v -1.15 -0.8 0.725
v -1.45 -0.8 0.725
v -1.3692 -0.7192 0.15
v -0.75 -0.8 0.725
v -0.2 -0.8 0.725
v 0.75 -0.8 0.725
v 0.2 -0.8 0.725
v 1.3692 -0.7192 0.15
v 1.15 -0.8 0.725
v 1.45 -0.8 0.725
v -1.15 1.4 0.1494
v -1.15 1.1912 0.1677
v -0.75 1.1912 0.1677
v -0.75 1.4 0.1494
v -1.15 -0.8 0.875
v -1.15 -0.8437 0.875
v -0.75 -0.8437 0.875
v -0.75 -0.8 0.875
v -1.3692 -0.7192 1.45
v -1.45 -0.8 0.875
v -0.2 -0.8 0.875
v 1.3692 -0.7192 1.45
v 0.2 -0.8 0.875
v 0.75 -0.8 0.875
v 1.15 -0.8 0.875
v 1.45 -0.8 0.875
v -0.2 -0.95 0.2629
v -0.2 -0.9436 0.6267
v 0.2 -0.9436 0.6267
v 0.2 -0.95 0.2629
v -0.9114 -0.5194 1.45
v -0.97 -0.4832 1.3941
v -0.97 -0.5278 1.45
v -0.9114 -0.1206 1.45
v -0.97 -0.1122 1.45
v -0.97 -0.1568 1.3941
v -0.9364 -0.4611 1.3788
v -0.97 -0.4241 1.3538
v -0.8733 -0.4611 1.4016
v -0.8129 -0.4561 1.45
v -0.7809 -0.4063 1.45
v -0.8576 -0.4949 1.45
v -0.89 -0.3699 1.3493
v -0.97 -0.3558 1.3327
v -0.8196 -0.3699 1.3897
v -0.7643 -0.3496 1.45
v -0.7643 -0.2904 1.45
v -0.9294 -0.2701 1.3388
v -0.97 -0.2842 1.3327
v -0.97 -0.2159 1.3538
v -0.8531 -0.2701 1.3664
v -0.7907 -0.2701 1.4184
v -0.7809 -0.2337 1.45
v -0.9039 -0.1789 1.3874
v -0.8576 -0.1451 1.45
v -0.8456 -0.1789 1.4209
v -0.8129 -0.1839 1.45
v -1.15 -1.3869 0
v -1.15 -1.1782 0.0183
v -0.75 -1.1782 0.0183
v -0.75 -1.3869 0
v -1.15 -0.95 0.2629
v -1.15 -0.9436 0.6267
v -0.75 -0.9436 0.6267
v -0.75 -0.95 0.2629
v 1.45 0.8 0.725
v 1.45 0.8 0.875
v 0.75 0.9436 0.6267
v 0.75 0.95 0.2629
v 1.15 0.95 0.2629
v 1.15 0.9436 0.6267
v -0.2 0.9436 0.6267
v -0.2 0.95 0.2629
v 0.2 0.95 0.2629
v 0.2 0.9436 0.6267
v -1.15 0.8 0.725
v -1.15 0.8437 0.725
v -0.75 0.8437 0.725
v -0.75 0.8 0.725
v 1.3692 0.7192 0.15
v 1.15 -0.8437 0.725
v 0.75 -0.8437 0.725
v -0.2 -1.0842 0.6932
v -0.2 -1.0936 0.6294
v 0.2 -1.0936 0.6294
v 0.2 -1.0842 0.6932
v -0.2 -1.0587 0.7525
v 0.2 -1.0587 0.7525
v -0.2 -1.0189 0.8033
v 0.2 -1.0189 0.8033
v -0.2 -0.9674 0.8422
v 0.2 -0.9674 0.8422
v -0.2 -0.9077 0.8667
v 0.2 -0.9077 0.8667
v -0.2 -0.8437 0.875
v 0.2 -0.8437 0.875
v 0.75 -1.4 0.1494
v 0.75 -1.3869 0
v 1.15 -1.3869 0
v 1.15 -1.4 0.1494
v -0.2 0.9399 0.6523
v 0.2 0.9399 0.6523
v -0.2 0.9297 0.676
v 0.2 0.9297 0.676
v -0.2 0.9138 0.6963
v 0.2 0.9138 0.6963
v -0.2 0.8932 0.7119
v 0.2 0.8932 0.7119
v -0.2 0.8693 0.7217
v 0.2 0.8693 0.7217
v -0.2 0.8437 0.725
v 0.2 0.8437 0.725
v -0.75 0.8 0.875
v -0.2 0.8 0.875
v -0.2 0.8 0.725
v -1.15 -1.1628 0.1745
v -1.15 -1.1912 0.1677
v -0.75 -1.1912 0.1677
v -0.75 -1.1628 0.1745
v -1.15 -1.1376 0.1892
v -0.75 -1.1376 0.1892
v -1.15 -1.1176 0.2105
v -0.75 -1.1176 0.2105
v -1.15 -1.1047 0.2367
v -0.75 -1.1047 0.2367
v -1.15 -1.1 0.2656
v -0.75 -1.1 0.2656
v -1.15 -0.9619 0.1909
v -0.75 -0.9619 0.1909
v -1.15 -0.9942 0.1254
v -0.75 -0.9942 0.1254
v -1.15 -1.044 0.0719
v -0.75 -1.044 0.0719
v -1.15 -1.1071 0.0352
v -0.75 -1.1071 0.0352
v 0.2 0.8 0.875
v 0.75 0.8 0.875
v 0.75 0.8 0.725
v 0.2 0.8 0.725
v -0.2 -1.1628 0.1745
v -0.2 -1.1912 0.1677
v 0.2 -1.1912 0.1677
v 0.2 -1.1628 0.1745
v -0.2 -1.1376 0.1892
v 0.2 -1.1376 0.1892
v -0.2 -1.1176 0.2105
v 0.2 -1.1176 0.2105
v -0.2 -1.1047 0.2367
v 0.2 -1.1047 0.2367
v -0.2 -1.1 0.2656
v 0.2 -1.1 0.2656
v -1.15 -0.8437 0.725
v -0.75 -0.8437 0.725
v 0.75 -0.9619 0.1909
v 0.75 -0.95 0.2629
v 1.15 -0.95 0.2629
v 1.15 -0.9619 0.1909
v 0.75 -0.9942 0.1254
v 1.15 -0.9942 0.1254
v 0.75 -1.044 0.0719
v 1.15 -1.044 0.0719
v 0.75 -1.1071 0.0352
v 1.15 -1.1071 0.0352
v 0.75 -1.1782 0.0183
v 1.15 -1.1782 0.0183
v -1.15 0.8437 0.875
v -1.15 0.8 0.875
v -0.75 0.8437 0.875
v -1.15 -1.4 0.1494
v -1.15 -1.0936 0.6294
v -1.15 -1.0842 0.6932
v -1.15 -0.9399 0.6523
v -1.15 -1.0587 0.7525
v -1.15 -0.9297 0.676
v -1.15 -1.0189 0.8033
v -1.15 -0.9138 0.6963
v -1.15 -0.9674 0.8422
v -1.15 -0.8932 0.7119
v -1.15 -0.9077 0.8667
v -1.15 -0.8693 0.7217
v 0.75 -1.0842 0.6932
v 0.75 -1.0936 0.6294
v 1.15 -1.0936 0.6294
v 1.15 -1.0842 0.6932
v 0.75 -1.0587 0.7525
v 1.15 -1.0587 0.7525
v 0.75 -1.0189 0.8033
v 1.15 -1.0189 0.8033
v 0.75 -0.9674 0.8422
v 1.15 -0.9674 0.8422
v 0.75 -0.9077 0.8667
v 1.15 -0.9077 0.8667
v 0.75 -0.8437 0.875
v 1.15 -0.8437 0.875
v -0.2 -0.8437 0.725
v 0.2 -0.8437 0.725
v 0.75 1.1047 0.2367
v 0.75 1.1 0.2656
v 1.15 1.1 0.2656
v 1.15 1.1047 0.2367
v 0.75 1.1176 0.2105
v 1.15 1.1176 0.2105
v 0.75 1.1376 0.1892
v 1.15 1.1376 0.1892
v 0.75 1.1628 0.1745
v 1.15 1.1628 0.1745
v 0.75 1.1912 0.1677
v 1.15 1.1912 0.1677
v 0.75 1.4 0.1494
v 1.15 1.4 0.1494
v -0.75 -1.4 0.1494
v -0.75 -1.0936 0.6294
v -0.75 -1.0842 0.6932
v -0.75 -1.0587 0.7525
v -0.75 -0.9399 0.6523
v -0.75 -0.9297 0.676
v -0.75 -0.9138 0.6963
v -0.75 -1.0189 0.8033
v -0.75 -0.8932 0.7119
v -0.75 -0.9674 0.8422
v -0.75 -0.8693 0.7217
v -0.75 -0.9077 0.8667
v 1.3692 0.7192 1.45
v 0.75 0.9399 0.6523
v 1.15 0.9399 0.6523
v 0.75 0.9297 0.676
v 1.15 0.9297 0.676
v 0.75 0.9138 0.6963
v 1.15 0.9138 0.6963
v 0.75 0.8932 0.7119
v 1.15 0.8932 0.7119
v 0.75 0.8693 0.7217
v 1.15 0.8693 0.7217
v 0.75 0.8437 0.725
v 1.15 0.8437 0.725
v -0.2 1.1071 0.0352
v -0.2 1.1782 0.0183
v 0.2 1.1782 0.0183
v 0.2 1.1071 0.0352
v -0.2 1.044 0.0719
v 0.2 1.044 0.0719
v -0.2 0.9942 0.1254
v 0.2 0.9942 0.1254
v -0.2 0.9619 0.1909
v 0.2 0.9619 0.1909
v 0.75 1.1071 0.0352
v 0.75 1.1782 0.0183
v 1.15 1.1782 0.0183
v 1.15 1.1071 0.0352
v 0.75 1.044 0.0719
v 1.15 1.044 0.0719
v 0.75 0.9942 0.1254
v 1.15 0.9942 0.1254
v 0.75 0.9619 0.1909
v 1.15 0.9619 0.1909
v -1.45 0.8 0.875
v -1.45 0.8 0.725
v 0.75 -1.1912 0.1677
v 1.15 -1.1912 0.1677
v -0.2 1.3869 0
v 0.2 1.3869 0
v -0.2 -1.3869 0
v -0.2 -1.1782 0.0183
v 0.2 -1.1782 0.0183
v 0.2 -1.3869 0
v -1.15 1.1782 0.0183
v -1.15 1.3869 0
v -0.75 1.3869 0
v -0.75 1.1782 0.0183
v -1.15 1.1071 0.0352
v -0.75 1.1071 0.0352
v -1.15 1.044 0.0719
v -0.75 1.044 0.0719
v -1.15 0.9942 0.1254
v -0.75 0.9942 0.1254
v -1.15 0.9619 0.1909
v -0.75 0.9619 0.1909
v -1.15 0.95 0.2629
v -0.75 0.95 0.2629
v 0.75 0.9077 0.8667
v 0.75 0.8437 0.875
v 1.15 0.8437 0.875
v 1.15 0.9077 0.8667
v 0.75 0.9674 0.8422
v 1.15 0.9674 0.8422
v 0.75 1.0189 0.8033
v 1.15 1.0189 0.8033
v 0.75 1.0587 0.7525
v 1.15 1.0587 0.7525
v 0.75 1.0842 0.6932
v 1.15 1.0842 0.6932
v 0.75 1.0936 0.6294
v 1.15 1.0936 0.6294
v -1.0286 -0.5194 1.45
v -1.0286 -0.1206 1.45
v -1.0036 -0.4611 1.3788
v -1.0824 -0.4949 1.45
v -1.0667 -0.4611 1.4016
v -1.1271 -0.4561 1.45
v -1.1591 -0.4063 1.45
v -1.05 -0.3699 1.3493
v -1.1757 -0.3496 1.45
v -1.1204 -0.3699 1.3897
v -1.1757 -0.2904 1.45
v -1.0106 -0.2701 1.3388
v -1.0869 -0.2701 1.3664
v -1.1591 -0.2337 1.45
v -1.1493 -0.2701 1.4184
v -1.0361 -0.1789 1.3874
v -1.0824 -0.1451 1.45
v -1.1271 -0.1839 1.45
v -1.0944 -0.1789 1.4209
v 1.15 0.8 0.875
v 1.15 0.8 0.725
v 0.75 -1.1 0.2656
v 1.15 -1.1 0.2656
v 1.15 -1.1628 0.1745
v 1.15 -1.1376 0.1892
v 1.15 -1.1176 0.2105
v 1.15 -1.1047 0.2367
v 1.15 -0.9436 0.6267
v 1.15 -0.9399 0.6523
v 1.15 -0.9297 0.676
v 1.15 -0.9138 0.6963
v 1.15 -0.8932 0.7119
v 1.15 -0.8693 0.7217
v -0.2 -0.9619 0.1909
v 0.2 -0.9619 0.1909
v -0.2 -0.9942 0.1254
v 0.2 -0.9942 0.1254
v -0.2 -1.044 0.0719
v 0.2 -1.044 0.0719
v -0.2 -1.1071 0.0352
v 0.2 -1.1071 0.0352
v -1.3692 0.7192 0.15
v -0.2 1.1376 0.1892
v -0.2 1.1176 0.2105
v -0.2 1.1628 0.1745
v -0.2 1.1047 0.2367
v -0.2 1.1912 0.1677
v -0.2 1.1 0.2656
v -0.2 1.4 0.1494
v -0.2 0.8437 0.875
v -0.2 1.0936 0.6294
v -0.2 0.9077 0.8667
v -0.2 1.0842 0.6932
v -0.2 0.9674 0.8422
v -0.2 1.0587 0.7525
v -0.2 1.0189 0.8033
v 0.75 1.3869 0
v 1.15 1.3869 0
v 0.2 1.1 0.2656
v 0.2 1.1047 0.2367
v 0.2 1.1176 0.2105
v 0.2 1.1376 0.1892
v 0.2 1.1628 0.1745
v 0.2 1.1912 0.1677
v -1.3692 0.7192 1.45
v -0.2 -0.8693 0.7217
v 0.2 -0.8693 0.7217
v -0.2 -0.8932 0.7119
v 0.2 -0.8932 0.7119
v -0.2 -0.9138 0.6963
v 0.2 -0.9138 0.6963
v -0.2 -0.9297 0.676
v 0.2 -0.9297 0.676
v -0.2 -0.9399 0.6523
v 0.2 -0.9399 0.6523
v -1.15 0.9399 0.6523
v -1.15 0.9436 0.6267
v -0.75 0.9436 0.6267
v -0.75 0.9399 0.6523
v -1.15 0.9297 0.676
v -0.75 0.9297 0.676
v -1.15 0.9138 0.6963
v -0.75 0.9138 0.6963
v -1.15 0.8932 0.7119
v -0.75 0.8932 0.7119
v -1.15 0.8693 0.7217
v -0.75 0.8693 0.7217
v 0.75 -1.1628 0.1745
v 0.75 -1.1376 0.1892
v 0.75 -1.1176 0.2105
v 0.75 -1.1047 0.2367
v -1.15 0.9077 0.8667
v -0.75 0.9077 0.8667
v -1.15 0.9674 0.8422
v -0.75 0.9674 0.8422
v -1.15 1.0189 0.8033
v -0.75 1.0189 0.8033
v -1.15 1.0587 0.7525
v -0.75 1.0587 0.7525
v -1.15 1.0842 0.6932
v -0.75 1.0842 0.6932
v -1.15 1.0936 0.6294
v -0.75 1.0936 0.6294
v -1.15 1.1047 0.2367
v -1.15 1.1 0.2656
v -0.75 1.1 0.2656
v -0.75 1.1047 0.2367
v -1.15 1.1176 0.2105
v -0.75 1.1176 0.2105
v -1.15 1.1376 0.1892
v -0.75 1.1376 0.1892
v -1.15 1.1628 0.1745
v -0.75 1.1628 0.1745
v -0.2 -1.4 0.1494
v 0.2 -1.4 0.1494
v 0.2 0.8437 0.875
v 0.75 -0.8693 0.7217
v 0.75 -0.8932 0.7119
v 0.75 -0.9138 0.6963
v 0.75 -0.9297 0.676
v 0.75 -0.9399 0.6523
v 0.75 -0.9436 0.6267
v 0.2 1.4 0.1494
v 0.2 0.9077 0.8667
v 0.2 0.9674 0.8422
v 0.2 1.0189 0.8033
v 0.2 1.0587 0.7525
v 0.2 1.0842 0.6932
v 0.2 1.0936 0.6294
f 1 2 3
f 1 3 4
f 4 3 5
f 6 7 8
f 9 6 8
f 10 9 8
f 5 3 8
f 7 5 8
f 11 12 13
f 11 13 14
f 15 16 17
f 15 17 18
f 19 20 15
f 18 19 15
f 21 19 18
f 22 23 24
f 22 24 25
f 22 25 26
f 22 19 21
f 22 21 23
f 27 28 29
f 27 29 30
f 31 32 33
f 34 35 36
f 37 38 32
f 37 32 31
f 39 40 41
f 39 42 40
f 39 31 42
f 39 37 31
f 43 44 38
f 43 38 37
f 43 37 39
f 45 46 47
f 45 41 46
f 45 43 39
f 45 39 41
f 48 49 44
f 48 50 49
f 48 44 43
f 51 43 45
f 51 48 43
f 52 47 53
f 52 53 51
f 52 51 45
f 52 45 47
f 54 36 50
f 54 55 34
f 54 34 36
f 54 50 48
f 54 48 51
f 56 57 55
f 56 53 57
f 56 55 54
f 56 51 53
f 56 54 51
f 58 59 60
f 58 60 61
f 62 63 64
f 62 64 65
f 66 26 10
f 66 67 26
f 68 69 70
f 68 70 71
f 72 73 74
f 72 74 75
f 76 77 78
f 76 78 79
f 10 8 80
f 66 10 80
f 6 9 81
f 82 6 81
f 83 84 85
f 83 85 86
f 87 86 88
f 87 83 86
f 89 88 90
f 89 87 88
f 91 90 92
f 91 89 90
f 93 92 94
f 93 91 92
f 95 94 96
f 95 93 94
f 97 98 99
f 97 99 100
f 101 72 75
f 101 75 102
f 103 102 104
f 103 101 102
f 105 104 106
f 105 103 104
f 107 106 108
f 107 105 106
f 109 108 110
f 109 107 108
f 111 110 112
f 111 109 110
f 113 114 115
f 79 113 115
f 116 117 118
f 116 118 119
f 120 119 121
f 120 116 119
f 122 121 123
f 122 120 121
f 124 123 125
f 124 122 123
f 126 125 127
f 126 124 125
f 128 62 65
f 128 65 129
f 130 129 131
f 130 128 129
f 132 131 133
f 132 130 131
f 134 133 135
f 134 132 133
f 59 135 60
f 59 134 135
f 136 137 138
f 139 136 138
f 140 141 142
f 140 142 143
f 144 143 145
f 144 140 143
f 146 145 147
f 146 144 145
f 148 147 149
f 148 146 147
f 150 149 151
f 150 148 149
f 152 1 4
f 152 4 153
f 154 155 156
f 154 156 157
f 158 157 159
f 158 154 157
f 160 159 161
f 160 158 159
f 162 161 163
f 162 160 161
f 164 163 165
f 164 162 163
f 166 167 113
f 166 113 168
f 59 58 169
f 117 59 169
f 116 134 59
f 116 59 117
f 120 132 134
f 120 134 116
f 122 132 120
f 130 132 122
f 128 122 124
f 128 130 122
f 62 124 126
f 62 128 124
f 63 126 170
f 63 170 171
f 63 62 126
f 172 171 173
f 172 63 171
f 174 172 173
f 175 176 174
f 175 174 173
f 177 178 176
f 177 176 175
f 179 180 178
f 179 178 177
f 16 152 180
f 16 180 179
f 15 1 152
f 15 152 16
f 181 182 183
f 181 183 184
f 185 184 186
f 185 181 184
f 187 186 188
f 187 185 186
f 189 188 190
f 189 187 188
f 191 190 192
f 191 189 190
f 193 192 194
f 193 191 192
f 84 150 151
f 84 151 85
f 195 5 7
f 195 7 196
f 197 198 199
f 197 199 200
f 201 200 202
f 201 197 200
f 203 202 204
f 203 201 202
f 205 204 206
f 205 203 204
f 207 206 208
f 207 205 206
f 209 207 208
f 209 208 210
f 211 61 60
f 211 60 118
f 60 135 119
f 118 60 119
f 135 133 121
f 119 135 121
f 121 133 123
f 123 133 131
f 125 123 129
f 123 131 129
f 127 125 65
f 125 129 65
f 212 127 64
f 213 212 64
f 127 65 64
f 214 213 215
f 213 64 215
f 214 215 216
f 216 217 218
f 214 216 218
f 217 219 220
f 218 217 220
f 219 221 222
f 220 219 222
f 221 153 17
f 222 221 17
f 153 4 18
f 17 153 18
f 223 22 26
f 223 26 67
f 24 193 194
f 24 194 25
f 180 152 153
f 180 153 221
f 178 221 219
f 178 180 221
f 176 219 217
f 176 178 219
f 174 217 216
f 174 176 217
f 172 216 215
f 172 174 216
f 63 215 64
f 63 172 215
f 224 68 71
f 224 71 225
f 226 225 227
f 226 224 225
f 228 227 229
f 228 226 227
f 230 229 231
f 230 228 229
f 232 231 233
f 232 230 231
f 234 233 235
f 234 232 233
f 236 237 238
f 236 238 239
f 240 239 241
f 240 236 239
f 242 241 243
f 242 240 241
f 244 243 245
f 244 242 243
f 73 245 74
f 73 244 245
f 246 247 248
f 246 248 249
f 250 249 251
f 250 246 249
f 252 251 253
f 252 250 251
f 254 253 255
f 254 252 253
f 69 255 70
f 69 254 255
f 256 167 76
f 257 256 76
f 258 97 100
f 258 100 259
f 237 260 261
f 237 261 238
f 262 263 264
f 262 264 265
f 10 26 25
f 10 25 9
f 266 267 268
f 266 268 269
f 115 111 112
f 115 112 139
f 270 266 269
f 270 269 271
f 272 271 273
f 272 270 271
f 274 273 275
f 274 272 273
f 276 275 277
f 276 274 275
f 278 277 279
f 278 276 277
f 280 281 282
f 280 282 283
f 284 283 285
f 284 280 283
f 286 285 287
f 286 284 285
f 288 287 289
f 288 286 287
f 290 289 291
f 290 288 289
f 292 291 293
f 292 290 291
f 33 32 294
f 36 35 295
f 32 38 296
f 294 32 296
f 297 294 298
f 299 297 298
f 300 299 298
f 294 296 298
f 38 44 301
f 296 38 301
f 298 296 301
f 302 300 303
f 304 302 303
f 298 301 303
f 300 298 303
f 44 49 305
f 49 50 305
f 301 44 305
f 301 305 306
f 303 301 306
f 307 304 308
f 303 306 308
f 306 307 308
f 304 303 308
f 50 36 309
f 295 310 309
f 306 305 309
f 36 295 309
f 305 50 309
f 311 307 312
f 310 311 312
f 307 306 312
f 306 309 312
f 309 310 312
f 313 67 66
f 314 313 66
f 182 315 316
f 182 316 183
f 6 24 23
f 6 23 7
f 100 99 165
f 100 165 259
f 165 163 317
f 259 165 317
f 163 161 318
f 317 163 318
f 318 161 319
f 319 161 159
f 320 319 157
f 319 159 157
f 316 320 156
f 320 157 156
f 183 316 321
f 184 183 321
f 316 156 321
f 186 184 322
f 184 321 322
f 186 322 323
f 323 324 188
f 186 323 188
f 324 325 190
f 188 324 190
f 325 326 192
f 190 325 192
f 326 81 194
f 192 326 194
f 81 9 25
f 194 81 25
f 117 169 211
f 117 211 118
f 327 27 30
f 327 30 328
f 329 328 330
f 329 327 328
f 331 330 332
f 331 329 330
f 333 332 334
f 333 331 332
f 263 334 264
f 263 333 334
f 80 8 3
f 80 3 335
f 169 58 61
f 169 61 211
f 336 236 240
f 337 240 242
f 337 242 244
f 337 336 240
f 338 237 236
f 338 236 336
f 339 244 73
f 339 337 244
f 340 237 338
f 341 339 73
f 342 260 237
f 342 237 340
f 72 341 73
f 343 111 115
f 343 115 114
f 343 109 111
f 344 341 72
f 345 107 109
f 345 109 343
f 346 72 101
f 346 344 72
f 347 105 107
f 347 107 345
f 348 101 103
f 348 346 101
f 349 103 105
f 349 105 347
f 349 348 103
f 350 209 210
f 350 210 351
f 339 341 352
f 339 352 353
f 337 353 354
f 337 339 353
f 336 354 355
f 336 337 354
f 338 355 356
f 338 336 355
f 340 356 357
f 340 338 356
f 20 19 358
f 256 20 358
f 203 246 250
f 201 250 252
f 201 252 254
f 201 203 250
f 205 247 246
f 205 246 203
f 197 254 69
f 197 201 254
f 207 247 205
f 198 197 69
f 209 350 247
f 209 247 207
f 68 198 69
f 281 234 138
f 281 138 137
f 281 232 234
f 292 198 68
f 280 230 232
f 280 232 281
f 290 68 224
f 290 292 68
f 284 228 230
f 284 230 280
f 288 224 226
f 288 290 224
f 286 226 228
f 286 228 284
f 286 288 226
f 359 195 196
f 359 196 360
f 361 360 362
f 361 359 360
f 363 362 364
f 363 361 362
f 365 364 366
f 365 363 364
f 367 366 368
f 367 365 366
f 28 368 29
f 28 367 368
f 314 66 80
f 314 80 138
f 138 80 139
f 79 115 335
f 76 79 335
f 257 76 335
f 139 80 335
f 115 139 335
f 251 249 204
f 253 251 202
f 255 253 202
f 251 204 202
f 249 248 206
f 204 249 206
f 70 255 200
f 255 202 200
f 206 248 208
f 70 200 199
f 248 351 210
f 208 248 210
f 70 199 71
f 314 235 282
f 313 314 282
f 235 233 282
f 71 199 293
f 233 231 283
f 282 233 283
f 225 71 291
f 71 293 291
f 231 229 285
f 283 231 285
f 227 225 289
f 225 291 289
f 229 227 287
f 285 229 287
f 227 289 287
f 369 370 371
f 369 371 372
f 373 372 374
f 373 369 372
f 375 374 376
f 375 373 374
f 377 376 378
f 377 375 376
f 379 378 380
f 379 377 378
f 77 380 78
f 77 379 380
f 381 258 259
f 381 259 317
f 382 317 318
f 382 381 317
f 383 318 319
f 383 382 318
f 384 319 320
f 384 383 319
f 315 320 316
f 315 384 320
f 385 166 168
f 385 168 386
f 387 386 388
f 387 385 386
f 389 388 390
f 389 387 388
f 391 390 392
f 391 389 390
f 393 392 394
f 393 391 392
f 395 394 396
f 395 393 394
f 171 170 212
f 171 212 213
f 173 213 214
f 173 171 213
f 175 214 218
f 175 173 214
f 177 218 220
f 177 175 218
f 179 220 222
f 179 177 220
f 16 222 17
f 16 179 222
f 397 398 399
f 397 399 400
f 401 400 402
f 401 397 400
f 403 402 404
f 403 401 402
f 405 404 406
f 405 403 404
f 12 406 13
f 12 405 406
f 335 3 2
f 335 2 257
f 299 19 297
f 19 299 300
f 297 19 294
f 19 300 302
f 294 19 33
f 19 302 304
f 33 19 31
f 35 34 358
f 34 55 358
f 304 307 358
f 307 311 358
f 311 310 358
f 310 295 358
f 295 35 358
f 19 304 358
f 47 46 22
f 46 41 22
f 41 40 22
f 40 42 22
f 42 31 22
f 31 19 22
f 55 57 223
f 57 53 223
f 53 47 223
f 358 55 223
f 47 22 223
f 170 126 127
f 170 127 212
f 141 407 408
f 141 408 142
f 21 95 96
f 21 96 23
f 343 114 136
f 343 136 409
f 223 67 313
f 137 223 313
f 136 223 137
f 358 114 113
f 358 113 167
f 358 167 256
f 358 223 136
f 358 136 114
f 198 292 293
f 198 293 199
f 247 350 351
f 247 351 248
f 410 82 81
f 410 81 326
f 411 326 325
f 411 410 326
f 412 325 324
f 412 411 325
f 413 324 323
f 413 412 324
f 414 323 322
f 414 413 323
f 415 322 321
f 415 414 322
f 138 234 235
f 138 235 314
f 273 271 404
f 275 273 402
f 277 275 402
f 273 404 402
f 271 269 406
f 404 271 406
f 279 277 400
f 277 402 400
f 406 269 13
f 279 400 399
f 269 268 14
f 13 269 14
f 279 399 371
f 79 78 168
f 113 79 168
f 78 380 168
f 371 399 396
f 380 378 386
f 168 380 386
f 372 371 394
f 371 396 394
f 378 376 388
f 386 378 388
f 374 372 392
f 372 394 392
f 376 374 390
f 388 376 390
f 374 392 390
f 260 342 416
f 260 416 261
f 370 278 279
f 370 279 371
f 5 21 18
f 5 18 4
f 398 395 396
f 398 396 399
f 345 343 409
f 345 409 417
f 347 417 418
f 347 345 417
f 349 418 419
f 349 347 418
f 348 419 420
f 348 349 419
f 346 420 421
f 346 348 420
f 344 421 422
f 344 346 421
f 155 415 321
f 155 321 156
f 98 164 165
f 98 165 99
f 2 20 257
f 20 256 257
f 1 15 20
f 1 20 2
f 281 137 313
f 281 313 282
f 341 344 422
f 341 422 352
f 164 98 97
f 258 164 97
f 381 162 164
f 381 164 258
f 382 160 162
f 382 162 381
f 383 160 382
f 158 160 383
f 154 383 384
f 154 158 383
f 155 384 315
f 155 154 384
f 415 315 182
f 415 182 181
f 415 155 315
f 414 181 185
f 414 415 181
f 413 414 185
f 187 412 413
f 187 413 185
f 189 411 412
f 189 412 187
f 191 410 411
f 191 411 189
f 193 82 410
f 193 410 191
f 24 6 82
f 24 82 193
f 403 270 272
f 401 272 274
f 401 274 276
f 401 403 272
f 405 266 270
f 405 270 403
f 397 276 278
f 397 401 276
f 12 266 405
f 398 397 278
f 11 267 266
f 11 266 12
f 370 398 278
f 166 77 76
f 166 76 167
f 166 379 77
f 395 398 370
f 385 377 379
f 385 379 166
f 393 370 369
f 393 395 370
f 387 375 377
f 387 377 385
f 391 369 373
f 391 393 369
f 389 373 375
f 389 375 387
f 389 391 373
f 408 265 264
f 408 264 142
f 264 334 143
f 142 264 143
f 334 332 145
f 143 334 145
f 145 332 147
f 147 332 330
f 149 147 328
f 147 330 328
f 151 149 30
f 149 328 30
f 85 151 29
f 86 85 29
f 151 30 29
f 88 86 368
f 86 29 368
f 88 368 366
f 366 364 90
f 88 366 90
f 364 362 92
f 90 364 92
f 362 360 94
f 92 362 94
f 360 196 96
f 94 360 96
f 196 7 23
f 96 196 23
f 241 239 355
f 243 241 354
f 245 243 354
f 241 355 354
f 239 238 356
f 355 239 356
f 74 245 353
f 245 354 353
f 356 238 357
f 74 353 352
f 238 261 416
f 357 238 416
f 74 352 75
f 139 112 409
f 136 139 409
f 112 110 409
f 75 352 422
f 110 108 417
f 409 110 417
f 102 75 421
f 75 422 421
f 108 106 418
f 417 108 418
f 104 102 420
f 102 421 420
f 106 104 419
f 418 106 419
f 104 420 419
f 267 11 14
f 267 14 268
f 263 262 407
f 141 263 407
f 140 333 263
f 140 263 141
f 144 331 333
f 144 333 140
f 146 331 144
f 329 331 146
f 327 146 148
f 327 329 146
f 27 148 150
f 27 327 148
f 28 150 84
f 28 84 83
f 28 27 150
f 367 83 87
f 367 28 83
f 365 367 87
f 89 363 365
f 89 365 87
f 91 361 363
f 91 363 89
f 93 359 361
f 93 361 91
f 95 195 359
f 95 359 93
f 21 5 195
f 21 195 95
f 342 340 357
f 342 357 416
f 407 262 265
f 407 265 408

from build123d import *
from OCP.BRepFilletAPI import BRepFilletAPI_MakeChamfer
from build123d.topology import SkipClean

# Parameters (mm, degrees)
BODYWXH_W          = 1.3
BODYWXH_H          = 1.6
BOSS_BODY_DEPTH    = 1.45
CHAMFER1_SIZE      = 0.575
CHAMFER1_SIZE2     = 0.08081098
PINS_DEPTH         = 0.4
PATTERNLEADS_COUNT = 3
PATTERNLEADS_PITCH = 0.95


with BuildPart() as part:
    # BodyWxH → Boss-Body (new, symmetric)
    with BuildSketch(Plane(origin=(0, 0, 0), x_dir=(0, 0, -1), z_dir=(1, 0, 0))):
        with Locations((-0.8, 0)):
            Rectangle(BODYWXH_W, BODYWXH_H)
    extrude(amount=BOSS_BODY_DEPTH, both=True)

    # Chamfer1: one chamfer whose edges measure the first distance from different faces: ONE call of the kernel's chamfer builder (chamfer() names one face for all edges)
    chamfer1_edges_1 = [part.edges().sort_by_distance(p)[0] for p in [
        (0, -0.8, 0.15),
        (0, -0.8, 1.45),
    ]]
    chamfer1_side_1 = [part.faces().sort_by_distance(p)[0] for p in [
        (0, -0.8, 0.8),
    ]]
    chamfer1_edges_2 = [part.edges().sort_by_distance(p)[0] for p in [
        (1.45, 0, 0.15),
        (1.45, 0, 1.45),
    ]]
    chamfer1_side_2 = [part.faces().sort_by_distance(p)[0] for p in [
        (1.45, 0, 0.8),
    ]]
    chamfer1_edges_3 = [part.edges().sort_by_distance(p)[0] for p in [
        (0, 0.8, 0.15),
        (0, 0.8, 1.45),
    ]]
    chamfer1_side_3 = [part.faces().sort_by_distance(p)[0] for p in [
        (0, 0.8, 0.8),
    ]]
    chamfer1_edges_4 = [part.edges().sort_by_distance(p)[0] for p in [
        (-1.45, 0, 0.15),
        (-1.45, 0, 1.45),
    ]]
    chamfer1_side_4 = [part.faces().sort_by_distance(p)[0] for p in [
        (-1.45, 0, 0.8),
    ]]
    chamfer1 = BRepFilletAPI_MakeChamfer(part.part.solid().wrapped)
    for e in chamfer1_edges_1:
        chamfer1.Add(CHAMFER1_SIZE, CHAMFER1_SIZE2, e.wrapped, chamfer1_side_1[0].wrapped)  # the first distance lies on this face
    for e in chamfer1_edges_2:
        chamfer1.Add(CHAMFER1_SIZE, CHAMFER1_SIZE2, e.wrapped, chamfer1_side_2[0].wrapped)  # the first distance lies on this face
    for e in chamfer1_edges_3:
        chamfer1.Add(CHAMFER1_SIZE, CHAMFER1_SIZE2, e.wrapped, chamfer1_side_3[0].wrapped)  # the first distance lies on this face
    for e in chamfer1_edges_4:
        chamfer1.Add(CHAMFER1_SIZE, CHAMFER1_SIZE2, e.wrapped, chamfer1_side_4[0].wrapped)  # the first distance lies on this face
    add(Compound.cast(chamfer1.Shape()), mode=Mode.REPLACE)

    # LeadCross → Pins (add)
    with BuildSketch(Plane(origin=(-1.15, 0, 0), x_dir=(0, 0, -1), z_dir=(1, 0, 0))):
        with BuildLine():
            Line((0, -1.386926639), (-0.149429205, -1.4))
            Line((-0.149429205, -1.4), (-0.167692783, -1.19124635))
            ThreePointArc((-0.167692783, -1.19124635), (-0.199112416, -1.126826554), (-0.265567012, -1.099977154))
            Line((-0.265567012, -1.099977154), (-0.629363102, -1.09362707))
            ThreePointArc((-0.629363102, -1.09362707), (-0.803312612, -1.018892462), (-0.875, -0.843665146))
            Line((-0.875, -0.843665146), (-0.875, 0.843665146))
            ThreePointArc((-0.875, 0.843665146), (-0.803312612, 1.018892462), (-0.629363102, 1.09362707))
            Line((-0.629363102, 1.09362707), (-0.265567012, 1.099977154))
            ThreePointArc((-0.265567012, 1.099977154), (-0.199112416, 1.126826554), (-0.167692783, 1.19124635))
            Line((-0.167692783, 1.19124635), (-0.149429205, 1.4))
            Line((-0.149429205, 1.4), (0, 1.386926639))
            Line((0, 1.386926639), (-0.018263578, 1.178172988))
            ThreePointArc((-0.018263578, 1.178172988), (-0.096812662, 1.017123498), (-0.262949151, 0.95))
            Line((-0.262949151, 0.95), (-0.626745241, 0.943649916))
            ThreePointArc((-0.626745241, 0.943649916), (-0.696325045, 0.913756073), (-0.725, 0.843665146))
            Line((-0.725, 0.843665146), (-0.725, -0.843665146))
            ThreePointArc((-0.725, -0.843665146), (-0.696325045, -0.913756073), (-0.626745241, -0.943649916))
            Line((-0.626745241, -0.943649916), (-0.262949151, -0.95))
            ThreePointArc((-0.262949151, -0.95), (-0.096812662, -1.017123498), (-0.018263578, -1.178172988))
            Line((-0.018263578, -1.178172988), (0, -1.386926639))
        make_face()
    pins = extrude(amount=PINS_DEPTH)

    # PatternLeads: Pins ×3
    with Locations(*[(i * PATTERNLEADS_PITCH, 0, 0) for i in range(1, PATTERNLEADS_COUNT)]):
        add(pins)

    # Pin1Indent → Cut-Pin1Indent (revolve, cut)
    with SkipClean():  # the faces are left unmerged after this step: merging them gives an invalid solid
        with BuildSketch(Plane(origin=(-0.97, 0, 0), x_dir=(0, 0, -1), z_dir=(1, 0, 0))):
            with BuildLine():
                Line((-1.57, -0.08), (-1.57, -0.56))
                ThreePointArc((-1.57, -0.56), (-1.33, -0.32), (-1.57, -0.08))
            make_face()
        revolve(axis=Axis((-0.97, -0.08, 1.57), (0, -1, 0)), mode=Mode.SUBTRACT)


solid = part.part
